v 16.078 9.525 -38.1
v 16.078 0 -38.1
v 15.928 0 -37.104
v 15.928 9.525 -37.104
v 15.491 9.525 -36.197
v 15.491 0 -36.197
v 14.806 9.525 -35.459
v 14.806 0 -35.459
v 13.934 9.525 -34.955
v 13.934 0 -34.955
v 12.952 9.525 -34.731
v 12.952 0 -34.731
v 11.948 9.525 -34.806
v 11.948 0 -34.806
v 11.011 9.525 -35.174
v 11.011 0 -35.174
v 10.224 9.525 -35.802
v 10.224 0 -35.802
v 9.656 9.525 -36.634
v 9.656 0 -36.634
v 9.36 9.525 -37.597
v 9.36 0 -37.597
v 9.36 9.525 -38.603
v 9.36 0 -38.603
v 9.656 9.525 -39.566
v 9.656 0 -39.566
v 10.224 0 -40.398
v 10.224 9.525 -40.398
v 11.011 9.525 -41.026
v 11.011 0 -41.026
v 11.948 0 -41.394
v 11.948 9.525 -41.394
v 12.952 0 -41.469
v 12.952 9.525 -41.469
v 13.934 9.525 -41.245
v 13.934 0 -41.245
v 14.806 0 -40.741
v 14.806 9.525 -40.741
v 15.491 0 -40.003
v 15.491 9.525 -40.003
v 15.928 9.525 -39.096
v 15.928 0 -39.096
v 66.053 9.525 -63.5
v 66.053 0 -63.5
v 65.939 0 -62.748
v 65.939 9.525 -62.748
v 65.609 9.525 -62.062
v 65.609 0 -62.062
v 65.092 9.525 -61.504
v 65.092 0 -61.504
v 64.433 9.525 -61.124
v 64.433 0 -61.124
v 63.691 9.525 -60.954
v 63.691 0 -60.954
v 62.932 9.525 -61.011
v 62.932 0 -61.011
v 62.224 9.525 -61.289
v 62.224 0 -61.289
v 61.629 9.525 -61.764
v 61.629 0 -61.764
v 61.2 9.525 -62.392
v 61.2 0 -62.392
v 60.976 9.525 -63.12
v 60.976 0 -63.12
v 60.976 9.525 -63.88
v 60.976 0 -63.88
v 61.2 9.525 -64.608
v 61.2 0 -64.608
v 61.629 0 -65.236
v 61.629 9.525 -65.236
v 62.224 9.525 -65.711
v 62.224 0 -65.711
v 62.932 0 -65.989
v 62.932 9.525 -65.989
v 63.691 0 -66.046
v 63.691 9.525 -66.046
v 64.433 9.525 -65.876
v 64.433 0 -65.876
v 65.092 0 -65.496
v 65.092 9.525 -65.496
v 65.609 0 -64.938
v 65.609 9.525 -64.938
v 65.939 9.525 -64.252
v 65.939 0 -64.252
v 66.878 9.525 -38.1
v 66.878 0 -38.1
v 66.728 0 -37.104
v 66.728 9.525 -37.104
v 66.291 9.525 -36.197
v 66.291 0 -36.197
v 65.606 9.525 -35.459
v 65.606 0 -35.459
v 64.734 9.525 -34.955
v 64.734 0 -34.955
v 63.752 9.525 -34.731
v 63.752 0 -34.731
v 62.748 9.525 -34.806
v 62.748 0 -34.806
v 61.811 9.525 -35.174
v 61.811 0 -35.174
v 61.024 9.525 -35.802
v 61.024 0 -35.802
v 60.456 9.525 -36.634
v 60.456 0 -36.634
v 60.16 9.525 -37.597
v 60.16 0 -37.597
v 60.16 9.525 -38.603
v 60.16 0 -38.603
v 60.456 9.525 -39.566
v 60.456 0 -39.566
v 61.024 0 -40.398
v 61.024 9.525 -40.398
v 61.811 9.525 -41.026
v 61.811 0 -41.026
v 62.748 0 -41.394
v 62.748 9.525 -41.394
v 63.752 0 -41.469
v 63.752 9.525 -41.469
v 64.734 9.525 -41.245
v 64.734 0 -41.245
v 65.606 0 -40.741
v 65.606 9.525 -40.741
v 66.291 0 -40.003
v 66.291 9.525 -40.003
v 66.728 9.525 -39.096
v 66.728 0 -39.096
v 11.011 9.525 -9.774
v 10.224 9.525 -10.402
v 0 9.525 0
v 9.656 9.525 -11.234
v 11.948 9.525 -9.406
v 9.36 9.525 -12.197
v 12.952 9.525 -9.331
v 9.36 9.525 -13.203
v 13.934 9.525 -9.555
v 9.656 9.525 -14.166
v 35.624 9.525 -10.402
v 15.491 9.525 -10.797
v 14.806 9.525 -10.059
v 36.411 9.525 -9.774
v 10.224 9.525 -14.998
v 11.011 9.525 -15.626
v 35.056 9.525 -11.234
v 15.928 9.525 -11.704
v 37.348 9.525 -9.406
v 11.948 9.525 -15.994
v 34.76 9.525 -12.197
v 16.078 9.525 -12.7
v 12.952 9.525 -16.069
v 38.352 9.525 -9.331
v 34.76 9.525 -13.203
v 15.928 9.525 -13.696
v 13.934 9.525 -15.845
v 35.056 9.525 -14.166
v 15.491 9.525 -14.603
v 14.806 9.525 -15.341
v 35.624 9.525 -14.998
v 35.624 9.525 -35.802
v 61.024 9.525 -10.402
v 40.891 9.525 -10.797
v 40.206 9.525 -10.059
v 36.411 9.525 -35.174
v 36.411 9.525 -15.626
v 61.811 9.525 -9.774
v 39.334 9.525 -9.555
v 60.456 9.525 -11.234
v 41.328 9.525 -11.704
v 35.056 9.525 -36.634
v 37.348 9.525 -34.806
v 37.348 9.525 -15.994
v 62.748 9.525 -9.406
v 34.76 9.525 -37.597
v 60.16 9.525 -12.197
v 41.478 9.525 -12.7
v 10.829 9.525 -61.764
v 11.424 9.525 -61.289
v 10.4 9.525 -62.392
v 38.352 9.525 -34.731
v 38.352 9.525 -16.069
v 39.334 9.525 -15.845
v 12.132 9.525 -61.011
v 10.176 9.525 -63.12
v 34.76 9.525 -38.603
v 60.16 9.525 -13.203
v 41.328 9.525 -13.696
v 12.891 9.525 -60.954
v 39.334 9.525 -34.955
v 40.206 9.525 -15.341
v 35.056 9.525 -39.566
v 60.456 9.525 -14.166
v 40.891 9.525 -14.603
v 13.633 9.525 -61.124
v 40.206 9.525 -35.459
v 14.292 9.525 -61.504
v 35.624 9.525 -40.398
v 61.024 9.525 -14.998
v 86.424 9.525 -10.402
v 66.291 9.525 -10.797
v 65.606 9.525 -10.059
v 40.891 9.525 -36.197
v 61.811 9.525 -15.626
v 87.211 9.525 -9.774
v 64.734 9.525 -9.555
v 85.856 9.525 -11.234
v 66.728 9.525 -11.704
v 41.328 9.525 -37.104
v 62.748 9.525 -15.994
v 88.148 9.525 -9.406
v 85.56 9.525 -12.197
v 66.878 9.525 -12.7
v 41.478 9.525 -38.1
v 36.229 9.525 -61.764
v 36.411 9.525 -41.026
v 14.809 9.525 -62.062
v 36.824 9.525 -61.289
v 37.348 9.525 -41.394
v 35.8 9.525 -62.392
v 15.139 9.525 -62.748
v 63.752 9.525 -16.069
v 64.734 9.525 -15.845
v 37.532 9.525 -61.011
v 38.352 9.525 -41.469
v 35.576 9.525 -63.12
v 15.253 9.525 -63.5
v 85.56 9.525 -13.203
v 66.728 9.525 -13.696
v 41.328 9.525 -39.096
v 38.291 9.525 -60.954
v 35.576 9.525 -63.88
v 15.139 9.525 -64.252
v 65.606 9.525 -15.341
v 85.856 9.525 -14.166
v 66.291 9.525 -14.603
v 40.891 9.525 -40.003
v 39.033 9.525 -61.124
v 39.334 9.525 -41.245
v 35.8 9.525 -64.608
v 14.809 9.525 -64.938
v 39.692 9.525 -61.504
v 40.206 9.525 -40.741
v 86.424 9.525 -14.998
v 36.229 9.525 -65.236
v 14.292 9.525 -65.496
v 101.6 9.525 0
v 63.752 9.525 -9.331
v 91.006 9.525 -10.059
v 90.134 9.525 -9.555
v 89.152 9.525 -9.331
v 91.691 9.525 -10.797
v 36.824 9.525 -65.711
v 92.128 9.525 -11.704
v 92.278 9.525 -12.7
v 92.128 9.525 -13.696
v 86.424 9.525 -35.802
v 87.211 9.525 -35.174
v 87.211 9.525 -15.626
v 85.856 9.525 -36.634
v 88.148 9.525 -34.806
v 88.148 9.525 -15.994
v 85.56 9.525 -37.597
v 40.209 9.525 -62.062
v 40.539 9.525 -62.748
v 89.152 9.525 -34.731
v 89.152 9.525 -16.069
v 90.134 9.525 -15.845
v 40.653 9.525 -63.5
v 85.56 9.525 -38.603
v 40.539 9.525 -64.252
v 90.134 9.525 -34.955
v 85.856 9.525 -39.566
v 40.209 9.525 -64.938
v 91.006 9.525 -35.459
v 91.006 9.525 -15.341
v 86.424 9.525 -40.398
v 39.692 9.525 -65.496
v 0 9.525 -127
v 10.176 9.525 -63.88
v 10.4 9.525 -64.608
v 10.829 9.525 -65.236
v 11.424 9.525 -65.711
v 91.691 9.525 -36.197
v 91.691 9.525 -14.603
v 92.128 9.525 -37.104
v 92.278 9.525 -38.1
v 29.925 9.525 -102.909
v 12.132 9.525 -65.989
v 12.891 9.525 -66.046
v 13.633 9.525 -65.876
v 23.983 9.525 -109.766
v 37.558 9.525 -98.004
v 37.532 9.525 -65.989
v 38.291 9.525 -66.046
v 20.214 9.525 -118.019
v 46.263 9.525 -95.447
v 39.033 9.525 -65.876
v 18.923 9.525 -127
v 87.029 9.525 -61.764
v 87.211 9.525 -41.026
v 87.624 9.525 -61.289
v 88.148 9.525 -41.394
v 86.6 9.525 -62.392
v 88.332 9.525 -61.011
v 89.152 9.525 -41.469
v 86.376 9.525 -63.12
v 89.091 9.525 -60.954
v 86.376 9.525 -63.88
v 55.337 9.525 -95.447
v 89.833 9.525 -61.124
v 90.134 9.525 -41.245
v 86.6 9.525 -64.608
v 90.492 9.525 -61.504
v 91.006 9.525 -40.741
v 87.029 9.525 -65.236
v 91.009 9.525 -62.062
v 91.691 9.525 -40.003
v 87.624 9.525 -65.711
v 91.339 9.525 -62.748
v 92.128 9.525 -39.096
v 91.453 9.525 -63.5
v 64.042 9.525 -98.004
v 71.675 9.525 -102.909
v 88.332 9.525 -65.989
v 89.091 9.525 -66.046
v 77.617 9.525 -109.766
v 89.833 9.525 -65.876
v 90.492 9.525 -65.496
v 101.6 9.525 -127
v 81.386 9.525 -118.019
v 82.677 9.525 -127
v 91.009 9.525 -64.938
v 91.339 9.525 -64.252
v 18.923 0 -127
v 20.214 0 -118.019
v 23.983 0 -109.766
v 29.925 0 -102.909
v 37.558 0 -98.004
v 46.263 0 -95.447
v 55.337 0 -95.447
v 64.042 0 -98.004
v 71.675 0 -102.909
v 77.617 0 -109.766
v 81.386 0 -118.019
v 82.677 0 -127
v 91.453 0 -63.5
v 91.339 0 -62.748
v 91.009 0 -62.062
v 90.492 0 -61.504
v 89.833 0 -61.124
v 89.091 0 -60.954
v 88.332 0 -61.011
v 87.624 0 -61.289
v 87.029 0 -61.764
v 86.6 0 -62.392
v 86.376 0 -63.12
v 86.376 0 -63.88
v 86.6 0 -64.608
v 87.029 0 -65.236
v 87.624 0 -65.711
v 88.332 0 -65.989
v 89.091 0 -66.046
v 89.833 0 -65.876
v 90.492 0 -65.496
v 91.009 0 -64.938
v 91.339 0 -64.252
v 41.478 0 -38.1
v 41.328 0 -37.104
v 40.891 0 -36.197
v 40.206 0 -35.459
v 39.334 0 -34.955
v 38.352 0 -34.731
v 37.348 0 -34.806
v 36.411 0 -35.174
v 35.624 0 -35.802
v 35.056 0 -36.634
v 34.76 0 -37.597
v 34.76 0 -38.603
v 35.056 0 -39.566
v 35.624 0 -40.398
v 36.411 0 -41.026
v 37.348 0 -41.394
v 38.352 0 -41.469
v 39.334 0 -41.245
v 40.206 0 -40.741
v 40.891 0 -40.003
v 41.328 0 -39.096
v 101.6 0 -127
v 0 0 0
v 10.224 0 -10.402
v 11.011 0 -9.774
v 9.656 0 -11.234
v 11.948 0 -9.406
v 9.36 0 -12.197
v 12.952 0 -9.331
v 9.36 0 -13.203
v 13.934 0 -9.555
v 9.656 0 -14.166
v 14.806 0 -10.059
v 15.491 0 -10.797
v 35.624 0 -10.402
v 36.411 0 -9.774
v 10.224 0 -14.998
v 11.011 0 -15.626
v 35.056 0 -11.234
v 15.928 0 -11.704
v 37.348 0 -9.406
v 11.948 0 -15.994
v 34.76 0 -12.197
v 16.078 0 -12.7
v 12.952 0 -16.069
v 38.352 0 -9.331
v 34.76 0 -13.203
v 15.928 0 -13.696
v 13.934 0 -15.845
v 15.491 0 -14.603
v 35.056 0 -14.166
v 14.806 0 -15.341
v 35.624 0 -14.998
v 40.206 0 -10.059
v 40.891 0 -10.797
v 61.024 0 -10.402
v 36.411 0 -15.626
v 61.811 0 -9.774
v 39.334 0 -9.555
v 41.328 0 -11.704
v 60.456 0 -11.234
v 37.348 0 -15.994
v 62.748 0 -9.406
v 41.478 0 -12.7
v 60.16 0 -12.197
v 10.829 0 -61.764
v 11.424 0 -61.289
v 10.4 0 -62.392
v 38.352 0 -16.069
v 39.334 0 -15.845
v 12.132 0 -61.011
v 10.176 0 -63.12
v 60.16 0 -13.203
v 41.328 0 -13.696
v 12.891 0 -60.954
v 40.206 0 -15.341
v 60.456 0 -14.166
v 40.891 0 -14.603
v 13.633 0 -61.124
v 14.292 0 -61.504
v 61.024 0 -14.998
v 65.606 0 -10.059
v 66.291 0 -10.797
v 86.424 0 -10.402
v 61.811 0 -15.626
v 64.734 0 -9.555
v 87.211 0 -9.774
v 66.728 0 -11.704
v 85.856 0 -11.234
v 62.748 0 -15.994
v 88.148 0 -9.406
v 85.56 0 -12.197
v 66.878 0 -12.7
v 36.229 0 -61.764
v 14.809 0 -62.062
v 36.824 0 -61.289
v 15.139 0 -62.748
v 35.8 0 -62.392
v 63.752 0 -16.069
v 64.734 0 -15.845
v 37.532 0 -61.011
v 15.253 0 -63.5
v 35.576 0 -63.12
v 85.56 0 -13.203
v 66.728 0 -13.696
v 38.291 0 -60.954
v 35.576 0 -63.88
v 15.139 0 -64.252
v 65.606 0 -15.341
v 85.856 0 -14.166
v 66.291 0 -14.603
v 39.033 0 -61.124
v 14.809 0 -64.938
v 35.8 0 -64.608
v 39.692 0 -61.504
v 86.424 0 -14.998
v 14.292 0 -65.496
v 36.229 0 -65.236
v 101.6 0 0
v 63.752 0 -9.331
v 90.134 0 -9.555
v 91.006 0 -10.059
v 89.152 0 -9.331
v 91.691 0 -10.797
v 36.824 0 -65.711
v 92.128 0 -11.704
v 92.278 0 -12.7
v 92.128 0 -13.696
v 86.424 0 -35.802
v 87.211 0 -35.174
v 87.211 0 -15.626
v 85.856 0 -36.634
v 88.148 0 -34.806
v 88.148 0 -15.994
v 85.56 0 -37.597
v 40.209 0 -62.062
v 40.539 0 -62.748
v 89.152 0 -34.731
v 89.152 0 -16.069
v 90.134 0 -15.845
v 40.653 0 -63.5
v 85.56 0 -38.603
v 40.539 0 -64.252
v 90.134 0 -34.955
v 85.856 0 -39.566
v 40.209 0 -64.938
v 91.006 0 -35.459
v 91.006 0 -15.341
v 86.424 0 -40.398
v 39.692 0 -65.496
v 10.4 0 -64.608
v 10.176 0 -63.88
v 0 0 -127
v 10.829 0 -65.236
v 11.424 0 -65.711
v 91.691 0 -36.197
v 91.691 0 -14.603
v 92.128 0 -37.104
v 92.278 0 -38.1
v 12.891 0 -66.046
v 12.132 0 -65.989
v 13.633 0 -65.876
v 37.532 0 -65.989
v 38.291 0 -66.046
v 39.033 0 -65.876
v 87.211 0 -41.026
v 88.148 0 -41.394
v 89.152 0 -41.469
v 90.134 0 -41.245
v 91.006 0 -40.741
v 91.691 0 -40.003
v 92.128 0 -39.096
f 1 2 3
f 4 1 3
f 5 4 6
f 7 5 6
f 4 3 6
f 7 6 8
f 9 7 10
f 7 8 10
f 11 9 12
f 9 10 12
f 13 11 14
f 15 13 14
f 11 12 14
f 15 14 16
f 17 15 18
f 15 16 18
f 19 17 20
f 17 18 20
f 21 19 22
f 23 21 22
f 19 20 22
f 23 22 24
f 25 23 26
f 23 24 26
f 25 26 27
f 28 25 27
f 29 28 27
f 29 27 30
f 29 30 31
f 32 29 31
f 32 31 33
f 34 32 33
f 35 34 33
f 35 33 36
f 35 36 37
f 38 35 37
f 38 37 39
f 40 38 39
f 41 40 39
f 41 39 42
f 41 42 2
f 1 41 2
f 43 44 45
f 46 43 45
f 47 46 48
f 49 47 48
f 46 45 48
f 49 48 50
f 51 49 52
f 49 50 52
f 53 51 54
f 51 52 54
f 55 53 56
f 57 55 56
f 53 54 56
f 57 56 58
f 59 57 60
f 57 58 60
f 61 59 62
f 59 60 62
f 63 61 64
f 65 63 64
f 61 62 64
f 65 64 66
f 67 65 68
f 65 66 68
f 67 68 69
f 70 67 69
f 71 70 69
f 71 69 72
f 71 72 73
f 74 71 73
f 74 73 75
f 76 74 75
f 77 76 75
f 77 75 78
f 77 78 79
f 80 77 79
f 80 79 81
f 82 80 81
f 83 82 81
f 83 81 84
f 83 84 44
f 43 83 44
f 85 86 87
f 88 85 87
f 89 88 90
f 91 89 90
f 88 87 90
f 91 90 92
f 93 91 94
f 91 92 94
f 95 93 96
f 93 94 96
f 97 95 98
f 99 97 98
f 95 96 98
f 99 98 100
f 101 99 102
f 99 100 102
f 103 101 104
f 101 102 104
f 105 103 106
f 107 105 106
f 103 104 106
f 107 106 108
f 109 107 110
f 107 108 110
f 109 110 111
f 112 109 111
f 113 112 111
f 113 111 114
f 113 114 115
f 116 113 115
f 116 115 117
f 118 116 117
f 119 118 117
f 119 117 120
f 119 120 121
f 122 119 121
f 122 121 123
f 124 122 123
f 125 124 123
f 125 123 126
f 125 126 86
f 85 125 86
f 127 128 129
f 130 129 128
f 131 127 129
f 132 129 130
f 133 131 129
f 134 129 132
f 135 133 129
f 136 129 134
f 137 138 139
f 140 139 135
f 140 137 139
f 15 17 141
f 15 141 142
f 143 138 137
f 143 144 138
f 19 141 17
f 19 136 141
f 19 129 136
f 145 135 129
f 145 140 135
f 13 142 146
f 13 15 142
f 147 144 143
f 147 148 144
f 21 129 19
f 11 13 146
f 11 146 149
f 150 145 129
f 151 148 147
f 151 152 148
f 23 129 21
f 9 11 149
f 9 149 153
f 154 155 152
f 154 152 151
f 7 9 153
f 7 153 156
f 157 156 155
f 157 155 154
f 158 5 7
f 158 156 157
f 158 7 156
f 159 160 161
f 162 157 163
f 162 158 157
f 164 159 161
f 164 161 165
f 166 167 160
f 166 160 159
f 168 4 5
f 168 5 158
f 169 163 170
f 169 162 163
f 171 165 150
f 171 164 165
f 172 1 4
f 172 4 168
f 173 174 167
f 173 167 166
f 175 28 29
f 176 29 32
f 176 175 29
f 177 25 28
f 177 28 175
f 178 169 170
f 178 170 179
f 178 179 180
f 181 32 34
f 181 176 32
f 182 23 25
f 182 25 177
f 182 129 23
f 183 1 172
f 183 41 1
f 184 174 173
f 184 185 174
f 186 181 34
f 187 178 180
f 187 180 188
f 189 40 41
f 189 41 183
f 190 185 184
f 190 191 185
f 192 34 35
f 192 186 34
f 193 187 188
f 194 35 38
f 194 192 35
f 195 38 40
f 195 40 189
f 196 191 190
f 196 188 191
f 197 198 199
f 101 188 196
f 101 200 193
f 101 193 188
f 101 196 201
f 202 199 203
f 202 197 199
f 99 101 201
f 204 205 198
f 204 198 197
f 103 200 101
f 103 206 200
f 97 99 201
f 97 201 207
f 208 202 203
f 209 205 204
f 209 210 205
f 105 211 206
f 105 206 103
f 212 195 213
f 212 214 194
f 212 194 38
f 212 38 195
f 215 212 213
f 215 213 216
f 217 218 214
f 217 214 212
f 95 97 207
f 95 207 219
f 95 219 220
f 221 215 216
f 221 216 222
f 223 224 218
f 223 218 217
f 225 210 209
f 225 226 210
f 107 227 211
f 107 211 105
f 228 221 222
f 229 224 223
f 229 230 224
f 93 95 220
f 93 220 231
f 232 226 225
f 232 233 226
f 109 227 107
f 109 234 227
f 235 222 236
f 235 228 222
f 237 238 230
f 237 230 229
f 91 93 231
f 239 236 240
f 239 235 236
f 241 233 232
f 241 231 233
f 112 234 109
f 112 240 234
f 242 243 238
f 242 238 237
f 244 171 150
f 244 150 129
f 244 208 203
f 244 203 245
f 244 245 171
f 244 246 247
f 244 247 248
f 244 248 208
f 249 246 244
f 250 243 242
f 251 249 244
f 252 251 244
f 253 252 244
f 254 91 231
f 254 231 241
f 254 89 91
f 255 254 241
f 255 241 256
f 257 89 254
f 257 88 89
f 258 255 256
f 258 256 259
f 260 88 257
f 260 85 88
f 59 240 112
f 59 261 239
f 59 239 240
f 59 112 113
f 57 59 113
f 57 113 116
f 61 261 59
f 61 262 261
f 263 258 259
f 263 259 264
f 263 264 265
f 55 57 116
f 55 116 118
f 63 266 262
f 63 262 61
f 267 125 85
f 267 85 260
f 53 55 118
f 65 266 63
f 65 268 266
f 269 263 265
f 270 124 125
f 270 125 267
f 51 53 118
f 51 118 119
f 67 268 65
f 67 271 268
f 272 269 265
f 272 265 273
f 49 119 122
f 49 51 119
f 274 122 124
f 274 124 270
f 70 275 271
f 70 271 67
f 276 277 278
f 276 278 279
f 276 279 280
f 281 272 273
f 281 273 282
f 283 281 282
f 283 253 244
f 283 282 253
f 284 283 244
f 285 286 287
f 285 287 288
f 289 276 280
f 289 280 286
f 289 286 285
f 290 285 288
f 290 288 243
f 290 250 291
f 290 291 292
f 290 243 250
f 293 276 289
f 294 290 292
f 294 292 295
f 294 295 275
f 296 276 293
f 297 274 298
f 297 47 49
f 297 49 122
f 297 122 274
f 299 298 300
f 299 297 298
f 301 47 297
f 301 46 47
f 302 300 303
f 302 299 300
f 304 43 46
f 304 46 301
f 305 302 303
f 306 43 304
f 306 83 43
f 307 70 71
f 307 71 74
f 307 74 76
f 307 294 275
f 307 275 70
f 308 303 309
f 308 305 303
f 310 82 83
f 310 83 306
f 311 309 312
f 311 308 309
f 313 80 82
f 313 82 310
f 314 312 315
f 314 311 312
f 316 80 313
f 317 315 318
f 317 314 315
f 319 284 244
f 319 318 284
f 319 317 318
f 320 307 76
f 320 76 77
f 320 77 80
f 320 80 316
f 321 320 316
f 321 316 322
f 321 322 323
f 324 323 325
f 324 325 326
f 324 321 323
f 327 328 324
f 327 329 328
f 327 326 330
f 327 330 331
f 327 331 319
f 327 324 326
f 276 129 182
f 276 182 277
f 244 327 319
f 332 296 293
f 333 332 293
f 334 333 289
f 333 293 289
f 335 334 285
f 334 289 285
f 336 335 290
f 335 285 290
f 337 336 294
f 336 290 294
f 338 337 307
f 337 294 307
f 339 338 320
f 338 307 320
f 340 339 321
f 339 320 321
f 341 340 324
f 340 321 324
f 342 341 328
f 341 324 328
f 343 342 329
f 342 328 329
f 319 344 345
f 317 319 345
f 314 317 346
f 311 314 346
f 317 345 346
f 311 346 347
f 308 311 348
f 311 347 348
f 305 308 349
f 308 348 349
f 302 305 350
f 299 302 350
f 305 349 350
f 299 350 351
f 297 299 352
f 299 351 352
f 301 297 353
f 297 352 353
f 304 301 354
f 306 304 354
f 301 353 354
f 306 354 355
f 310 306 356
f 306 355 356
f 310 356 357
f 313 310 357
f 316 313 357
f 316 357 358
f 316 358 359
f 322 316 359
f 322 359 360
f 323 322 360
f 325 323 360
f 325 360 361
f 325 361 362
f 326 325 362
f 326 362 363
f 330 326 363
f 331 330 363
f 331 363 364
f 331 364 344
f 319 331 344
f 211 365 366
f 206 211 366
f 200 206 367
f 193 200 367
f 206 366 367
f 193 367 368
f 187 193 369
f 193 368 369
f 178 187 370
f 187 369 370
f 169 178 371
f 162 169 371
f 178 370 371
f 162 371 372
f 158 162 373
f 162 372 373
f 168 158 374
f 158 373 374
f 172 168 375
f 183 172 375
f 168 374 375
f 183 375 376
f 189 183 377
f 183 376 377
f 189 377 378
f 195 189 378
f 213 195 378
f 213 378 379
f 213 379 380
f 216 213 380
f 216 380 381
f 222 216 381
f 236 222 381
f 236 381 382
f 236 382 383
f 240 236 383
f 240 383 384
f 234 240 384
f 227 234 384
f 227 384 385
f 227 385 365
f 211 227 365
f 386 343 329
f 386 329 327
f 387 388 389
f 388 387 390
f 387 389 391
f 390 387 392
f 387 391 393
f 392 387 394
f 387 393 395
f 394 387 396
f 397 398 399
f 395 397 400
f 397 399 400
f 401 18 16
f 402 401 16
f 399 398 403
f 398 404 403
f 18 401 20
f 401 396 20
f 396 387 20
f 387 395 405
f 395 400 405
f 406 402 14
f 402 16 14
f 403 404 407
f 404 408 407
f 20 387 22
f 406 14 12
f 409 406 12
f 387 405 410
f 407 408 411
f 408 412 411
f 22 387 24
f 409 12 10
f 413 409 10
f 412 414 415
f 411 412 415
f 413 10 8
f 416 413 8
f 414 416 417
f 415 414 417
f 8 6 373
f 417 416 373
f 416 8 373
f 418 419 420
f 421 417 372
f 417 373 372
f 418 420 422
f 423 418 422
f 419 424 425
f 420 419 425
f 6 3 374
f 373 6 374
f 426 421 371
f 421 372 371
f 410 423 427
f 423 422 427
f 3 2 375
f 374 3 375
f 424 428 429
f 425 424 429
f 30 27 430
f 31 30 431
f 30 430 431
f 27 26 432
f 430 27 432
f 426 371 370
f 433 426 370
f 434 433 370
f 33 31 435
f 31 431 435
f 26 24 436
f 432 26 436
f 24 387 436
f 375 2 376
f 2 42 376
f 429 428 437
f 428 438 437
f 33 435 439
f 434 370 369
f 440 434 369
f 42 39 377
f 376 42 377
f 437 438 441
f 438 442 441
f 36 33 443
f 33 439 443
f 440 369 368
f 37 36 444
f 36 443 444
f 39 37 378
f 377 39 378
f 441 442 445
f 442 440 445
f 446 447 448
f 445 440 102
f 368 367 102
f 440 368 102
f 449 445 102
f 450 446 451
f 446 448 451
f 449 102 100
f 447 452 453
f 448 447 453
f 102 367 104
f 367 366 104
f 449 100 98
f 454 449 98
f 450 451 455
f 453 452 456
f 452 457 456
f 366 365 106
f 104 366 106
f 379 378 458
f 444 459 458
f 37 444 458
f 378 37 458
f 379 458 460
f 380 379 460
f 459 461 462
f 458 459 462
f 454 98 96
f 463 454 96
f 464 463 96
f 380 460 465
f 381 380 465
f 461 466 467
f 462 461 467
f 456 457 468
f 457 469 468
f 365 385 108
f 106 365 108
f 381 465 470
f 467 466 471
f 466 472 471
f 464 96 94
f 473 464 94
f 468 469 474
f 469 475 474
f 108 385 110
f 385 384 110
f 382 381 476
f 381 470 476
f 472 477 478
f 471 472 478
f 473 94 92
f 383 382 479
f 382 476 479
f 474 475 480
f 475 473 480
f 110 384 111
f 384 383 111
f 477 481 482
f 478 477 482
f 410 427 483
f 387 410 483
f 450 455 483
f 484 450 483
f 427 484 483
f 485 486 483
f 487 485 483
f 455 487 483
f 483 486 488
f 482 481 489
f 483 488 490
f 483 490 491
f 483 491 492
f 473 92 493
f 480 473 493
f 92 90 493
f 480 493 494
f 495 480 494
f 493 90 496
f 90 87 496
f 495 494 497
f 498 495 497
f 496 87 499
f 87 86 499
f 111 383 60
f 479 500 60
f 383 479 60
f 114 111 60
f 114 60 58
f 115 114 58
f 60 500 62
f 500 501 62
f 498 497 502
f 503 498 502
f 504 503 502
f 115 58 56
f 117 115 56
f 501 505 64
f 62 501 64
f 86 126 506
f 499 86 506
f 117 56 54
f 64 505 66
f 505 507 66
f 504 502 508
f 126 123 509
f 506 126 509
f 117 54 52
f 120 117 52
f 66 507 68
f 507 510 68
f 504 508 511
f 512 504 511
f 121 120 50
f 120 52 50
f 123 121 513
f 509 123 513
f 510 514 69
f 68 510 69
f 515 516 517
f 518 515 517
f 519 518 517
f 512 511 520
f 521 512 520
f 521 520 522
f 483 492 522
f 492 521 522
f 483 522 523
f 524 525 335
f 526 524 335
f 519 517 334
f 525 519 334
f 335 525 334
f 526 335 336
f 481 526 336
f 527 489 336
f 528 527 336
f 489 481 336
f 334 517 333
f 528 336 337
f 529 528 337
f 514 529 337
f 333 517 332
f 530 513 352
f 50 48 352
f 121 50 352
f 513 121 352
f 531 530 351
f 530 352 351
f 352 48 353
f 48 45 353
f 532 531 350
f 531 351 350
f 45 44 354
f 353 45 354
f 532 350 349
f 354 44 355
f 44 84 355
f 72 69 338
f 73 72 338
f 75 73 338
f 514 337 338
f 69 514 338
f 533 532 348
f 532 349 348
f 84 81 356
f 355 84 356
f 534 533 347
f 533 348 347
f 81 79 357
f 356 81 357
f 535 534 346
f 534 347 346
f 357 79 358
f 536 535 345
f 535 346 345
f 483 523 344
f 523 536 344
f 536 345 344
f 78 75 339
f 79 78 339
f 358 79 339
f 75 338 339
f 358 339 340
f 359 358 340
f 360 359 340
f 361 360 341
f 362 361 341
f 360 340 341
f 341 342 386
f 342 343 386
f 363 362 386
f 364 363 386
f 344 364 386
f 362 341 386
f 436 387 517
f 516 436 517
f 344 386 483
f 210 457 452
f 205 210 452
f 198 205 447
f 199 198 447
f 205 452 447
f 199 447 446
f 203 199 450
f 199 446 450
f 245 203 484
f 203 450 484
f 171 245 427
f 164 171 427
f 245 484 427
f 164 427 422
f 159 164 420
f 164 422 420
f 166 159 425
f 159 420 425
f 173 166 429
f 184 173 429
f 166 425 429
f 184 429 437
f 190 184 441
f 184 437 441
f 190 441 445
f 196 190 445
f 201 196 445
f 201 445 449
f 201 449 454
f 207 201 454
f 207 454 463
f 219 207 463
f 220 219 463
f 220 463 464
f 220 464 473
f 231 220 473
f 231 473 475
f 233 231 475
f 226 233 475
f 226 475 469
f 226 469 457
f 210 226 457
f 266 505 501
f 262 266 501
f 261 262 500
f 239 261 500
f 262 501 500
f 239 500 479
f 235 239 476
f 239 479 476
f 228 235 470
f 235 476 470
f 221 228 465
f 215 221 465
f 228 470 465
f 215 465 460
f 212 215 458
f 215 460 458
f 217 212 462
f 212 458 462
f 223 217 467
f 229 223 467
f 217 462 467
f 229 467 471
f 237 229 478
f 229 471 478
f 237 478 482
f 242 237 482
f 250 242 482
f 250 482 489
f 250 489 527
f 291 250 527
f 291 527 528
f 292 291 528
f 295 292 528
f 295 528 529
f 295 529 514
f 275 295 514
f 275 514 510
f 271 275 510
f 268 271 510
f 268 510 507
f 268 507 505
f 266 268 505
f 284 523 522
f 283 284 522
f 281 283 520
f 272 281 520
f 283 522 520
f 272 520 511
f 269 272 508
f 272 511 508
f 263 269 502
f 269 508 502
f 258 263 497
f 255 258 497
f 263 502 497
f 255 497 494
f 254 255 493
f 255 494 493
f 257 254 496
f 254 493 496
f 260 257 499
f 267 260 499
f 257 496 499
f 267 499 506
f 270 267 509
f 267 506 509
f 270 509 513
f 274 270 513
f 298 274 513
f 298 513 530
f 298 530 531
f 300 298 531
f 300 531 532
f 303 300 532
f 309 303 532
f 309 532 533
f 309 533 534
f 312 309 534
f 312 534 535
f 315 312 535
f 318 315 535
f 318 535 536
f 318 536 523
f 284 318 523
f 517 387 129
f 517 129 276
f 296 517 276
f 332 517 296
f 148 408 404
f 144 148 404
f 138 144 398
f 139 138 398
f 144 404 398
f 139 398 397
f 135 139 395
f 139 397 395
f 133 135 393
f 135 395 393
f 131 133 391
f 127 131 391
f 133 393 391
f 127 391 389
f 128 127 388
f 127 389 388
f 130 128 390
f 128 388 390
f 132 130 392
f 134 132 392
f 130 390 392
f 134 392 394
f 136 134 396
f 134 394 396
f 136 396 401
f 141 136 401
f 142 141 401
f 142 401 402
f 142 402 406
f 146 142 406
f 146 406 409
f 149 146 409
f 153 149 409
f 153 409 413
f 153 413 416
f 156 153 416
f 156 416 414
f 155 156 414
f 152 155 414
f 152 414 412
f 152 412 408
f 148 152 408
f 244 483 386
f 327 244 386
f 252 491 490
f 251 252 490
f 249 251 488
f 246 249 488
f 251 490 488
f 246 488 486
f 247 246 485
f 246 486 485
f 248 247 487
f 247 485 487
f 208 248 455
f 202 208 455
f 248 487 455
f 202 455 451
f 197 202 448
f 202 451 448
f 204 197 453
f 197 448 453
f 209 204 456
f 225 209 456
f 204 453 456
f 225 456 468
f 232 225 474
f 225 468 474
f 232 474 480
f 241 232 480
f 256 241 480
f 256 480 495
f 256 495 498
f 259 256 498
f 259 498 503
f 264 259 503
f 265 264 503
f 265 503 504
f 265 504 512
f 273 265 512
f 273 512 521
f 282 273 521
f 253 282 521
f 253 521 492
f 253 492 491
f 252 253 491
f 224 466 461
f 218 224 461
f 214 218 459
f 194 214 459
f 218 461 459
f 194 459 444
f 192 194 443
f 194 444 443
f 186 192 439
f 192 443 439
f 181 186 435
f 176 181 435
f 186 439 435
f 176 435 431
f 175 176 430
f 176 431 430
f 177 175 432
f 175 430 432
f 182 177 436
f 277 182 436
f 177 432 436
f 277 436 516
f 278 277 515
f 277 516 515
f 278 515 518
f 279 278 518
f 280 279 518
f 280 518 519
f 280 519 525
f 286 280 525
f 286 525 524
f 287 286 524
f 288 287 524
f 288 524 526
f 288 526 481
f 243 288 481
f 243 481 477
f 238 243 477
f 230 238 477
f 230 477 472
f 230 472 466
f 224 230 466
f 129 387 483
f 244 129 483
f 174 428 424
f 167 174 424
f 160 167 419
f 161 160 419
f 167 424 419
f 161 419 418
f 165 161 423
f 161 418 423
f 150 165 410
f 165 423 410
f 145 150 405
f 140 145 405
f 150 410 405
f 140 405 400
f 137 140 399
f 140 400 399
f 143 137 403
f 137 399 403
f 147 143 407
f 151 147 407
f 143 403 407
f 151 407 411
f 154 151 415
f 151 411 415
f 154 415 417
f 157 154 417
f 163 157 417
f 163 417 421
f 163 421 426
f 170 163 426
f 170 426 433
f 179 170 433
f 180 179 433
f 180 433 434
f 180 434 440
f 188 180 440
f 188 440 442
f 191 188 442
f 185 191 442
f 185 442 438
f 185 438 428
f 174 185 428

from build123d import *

# Parameters (mm, degrees)
SKETCH1_W                   = 101.6
SKETCH1_H                   = 127
BOSS_EXTRUDE1_DEPTH         = 9.525
SKETCH2_R                   = 31.877
CUT_EXTRUDE1_DEPTH          = 10.525
F_1_4_CLEARANCE_HOLE1_D     = 6.7564
LPATTERN1_COUNT             = 2
LPATTERN1_PITCH             = 25.4
LPATTERN1_COUNT_DIR2        = 4
LPATTERN1_PITCH_DIR2        = 25.4
TAP_DRILL_FOR_1_4_20_TAP1_D = 5.1054
LPATTERN2_COUNT             = 4
LPATTERN2_PITCH             = 25.4


with BuildPart() as part:
    # Sketch1 → Boss-Extrude1 (new body)
    with BuildSketch(Plane(origin=(0, 0, 0), x_dir=(1, 0, 0), z_dir=(0, 1, 0))):
        with Locations((50.8, 63.5)):
            Rectangle(SKETCH1_W, SKETCH1_H)
    extrude(amount=BOSS_EXTRUDE1_DEPTH)

    # Sketch2 → Cut-Extrude1 (cut, through all)
    with BuildSketch(Plane(origin=(0, 9.525, 0), x_dir=(1, 0, 0), z_dir=(0, 1, 0))):
        with Locations((50.8, 127)):
            Circle(SKETCH2_R)
    extrude(amount=-CUT_EXTRUDE1_DEPTH, mode=Mode.SUBTRACT)

    # 1/4 Clearance Hole1 (through all)
    with Locations(Plane(origin=(0, 9.525, 0), x_dir=(-1, 0, 0), z_dir=(0, 1, 0))):
        with Locations((-12.7, -12.7)):
            f_1_4_clearance_hole1 = Hole(F_1_4_CLEARANCE_HOLE1_D / 2)

    # LPattern1: 1_4 Clearance Hole1 2 × 4
    with Locations(*[(j * LPATTERN1_PITCH_DIR2, 0, -i * LPATTERN1_PITCH) for i in range(LPATTERN1_COUNT) for j in range(LPATTERN1_COUNT_DIR2) if (i, j) != (0, 0)]):
        add(f_1_4_clearance_hole1, mode=Mode.SUBTRACT)

    # Tap Drill for 1/4-20 Tap1 (through all)
    with Locations(Plane(origin=(0, 9.525, 0), x_dir=(-1, 0, 0), z_dir=(0, 1, 0))):
        with Locations((-12.7, -63.5)):
            tap_drill_for_1_4_20_tap1 = Hole(TAP_DRILL_FOR_1_4_20_TAP1_D / 2)

    # LPattern2: Tap Drill for 1/4-20 Tap1 ×4
    with Locations(*[(i * LPATTERN2_PITCH, 0, 0) for i in range(1, LPATTERN2_COUNT)]):
        add(tap_drill_for_1_4_20_tap1, mode=Mode.SUBTRACT)


solid = part.part
